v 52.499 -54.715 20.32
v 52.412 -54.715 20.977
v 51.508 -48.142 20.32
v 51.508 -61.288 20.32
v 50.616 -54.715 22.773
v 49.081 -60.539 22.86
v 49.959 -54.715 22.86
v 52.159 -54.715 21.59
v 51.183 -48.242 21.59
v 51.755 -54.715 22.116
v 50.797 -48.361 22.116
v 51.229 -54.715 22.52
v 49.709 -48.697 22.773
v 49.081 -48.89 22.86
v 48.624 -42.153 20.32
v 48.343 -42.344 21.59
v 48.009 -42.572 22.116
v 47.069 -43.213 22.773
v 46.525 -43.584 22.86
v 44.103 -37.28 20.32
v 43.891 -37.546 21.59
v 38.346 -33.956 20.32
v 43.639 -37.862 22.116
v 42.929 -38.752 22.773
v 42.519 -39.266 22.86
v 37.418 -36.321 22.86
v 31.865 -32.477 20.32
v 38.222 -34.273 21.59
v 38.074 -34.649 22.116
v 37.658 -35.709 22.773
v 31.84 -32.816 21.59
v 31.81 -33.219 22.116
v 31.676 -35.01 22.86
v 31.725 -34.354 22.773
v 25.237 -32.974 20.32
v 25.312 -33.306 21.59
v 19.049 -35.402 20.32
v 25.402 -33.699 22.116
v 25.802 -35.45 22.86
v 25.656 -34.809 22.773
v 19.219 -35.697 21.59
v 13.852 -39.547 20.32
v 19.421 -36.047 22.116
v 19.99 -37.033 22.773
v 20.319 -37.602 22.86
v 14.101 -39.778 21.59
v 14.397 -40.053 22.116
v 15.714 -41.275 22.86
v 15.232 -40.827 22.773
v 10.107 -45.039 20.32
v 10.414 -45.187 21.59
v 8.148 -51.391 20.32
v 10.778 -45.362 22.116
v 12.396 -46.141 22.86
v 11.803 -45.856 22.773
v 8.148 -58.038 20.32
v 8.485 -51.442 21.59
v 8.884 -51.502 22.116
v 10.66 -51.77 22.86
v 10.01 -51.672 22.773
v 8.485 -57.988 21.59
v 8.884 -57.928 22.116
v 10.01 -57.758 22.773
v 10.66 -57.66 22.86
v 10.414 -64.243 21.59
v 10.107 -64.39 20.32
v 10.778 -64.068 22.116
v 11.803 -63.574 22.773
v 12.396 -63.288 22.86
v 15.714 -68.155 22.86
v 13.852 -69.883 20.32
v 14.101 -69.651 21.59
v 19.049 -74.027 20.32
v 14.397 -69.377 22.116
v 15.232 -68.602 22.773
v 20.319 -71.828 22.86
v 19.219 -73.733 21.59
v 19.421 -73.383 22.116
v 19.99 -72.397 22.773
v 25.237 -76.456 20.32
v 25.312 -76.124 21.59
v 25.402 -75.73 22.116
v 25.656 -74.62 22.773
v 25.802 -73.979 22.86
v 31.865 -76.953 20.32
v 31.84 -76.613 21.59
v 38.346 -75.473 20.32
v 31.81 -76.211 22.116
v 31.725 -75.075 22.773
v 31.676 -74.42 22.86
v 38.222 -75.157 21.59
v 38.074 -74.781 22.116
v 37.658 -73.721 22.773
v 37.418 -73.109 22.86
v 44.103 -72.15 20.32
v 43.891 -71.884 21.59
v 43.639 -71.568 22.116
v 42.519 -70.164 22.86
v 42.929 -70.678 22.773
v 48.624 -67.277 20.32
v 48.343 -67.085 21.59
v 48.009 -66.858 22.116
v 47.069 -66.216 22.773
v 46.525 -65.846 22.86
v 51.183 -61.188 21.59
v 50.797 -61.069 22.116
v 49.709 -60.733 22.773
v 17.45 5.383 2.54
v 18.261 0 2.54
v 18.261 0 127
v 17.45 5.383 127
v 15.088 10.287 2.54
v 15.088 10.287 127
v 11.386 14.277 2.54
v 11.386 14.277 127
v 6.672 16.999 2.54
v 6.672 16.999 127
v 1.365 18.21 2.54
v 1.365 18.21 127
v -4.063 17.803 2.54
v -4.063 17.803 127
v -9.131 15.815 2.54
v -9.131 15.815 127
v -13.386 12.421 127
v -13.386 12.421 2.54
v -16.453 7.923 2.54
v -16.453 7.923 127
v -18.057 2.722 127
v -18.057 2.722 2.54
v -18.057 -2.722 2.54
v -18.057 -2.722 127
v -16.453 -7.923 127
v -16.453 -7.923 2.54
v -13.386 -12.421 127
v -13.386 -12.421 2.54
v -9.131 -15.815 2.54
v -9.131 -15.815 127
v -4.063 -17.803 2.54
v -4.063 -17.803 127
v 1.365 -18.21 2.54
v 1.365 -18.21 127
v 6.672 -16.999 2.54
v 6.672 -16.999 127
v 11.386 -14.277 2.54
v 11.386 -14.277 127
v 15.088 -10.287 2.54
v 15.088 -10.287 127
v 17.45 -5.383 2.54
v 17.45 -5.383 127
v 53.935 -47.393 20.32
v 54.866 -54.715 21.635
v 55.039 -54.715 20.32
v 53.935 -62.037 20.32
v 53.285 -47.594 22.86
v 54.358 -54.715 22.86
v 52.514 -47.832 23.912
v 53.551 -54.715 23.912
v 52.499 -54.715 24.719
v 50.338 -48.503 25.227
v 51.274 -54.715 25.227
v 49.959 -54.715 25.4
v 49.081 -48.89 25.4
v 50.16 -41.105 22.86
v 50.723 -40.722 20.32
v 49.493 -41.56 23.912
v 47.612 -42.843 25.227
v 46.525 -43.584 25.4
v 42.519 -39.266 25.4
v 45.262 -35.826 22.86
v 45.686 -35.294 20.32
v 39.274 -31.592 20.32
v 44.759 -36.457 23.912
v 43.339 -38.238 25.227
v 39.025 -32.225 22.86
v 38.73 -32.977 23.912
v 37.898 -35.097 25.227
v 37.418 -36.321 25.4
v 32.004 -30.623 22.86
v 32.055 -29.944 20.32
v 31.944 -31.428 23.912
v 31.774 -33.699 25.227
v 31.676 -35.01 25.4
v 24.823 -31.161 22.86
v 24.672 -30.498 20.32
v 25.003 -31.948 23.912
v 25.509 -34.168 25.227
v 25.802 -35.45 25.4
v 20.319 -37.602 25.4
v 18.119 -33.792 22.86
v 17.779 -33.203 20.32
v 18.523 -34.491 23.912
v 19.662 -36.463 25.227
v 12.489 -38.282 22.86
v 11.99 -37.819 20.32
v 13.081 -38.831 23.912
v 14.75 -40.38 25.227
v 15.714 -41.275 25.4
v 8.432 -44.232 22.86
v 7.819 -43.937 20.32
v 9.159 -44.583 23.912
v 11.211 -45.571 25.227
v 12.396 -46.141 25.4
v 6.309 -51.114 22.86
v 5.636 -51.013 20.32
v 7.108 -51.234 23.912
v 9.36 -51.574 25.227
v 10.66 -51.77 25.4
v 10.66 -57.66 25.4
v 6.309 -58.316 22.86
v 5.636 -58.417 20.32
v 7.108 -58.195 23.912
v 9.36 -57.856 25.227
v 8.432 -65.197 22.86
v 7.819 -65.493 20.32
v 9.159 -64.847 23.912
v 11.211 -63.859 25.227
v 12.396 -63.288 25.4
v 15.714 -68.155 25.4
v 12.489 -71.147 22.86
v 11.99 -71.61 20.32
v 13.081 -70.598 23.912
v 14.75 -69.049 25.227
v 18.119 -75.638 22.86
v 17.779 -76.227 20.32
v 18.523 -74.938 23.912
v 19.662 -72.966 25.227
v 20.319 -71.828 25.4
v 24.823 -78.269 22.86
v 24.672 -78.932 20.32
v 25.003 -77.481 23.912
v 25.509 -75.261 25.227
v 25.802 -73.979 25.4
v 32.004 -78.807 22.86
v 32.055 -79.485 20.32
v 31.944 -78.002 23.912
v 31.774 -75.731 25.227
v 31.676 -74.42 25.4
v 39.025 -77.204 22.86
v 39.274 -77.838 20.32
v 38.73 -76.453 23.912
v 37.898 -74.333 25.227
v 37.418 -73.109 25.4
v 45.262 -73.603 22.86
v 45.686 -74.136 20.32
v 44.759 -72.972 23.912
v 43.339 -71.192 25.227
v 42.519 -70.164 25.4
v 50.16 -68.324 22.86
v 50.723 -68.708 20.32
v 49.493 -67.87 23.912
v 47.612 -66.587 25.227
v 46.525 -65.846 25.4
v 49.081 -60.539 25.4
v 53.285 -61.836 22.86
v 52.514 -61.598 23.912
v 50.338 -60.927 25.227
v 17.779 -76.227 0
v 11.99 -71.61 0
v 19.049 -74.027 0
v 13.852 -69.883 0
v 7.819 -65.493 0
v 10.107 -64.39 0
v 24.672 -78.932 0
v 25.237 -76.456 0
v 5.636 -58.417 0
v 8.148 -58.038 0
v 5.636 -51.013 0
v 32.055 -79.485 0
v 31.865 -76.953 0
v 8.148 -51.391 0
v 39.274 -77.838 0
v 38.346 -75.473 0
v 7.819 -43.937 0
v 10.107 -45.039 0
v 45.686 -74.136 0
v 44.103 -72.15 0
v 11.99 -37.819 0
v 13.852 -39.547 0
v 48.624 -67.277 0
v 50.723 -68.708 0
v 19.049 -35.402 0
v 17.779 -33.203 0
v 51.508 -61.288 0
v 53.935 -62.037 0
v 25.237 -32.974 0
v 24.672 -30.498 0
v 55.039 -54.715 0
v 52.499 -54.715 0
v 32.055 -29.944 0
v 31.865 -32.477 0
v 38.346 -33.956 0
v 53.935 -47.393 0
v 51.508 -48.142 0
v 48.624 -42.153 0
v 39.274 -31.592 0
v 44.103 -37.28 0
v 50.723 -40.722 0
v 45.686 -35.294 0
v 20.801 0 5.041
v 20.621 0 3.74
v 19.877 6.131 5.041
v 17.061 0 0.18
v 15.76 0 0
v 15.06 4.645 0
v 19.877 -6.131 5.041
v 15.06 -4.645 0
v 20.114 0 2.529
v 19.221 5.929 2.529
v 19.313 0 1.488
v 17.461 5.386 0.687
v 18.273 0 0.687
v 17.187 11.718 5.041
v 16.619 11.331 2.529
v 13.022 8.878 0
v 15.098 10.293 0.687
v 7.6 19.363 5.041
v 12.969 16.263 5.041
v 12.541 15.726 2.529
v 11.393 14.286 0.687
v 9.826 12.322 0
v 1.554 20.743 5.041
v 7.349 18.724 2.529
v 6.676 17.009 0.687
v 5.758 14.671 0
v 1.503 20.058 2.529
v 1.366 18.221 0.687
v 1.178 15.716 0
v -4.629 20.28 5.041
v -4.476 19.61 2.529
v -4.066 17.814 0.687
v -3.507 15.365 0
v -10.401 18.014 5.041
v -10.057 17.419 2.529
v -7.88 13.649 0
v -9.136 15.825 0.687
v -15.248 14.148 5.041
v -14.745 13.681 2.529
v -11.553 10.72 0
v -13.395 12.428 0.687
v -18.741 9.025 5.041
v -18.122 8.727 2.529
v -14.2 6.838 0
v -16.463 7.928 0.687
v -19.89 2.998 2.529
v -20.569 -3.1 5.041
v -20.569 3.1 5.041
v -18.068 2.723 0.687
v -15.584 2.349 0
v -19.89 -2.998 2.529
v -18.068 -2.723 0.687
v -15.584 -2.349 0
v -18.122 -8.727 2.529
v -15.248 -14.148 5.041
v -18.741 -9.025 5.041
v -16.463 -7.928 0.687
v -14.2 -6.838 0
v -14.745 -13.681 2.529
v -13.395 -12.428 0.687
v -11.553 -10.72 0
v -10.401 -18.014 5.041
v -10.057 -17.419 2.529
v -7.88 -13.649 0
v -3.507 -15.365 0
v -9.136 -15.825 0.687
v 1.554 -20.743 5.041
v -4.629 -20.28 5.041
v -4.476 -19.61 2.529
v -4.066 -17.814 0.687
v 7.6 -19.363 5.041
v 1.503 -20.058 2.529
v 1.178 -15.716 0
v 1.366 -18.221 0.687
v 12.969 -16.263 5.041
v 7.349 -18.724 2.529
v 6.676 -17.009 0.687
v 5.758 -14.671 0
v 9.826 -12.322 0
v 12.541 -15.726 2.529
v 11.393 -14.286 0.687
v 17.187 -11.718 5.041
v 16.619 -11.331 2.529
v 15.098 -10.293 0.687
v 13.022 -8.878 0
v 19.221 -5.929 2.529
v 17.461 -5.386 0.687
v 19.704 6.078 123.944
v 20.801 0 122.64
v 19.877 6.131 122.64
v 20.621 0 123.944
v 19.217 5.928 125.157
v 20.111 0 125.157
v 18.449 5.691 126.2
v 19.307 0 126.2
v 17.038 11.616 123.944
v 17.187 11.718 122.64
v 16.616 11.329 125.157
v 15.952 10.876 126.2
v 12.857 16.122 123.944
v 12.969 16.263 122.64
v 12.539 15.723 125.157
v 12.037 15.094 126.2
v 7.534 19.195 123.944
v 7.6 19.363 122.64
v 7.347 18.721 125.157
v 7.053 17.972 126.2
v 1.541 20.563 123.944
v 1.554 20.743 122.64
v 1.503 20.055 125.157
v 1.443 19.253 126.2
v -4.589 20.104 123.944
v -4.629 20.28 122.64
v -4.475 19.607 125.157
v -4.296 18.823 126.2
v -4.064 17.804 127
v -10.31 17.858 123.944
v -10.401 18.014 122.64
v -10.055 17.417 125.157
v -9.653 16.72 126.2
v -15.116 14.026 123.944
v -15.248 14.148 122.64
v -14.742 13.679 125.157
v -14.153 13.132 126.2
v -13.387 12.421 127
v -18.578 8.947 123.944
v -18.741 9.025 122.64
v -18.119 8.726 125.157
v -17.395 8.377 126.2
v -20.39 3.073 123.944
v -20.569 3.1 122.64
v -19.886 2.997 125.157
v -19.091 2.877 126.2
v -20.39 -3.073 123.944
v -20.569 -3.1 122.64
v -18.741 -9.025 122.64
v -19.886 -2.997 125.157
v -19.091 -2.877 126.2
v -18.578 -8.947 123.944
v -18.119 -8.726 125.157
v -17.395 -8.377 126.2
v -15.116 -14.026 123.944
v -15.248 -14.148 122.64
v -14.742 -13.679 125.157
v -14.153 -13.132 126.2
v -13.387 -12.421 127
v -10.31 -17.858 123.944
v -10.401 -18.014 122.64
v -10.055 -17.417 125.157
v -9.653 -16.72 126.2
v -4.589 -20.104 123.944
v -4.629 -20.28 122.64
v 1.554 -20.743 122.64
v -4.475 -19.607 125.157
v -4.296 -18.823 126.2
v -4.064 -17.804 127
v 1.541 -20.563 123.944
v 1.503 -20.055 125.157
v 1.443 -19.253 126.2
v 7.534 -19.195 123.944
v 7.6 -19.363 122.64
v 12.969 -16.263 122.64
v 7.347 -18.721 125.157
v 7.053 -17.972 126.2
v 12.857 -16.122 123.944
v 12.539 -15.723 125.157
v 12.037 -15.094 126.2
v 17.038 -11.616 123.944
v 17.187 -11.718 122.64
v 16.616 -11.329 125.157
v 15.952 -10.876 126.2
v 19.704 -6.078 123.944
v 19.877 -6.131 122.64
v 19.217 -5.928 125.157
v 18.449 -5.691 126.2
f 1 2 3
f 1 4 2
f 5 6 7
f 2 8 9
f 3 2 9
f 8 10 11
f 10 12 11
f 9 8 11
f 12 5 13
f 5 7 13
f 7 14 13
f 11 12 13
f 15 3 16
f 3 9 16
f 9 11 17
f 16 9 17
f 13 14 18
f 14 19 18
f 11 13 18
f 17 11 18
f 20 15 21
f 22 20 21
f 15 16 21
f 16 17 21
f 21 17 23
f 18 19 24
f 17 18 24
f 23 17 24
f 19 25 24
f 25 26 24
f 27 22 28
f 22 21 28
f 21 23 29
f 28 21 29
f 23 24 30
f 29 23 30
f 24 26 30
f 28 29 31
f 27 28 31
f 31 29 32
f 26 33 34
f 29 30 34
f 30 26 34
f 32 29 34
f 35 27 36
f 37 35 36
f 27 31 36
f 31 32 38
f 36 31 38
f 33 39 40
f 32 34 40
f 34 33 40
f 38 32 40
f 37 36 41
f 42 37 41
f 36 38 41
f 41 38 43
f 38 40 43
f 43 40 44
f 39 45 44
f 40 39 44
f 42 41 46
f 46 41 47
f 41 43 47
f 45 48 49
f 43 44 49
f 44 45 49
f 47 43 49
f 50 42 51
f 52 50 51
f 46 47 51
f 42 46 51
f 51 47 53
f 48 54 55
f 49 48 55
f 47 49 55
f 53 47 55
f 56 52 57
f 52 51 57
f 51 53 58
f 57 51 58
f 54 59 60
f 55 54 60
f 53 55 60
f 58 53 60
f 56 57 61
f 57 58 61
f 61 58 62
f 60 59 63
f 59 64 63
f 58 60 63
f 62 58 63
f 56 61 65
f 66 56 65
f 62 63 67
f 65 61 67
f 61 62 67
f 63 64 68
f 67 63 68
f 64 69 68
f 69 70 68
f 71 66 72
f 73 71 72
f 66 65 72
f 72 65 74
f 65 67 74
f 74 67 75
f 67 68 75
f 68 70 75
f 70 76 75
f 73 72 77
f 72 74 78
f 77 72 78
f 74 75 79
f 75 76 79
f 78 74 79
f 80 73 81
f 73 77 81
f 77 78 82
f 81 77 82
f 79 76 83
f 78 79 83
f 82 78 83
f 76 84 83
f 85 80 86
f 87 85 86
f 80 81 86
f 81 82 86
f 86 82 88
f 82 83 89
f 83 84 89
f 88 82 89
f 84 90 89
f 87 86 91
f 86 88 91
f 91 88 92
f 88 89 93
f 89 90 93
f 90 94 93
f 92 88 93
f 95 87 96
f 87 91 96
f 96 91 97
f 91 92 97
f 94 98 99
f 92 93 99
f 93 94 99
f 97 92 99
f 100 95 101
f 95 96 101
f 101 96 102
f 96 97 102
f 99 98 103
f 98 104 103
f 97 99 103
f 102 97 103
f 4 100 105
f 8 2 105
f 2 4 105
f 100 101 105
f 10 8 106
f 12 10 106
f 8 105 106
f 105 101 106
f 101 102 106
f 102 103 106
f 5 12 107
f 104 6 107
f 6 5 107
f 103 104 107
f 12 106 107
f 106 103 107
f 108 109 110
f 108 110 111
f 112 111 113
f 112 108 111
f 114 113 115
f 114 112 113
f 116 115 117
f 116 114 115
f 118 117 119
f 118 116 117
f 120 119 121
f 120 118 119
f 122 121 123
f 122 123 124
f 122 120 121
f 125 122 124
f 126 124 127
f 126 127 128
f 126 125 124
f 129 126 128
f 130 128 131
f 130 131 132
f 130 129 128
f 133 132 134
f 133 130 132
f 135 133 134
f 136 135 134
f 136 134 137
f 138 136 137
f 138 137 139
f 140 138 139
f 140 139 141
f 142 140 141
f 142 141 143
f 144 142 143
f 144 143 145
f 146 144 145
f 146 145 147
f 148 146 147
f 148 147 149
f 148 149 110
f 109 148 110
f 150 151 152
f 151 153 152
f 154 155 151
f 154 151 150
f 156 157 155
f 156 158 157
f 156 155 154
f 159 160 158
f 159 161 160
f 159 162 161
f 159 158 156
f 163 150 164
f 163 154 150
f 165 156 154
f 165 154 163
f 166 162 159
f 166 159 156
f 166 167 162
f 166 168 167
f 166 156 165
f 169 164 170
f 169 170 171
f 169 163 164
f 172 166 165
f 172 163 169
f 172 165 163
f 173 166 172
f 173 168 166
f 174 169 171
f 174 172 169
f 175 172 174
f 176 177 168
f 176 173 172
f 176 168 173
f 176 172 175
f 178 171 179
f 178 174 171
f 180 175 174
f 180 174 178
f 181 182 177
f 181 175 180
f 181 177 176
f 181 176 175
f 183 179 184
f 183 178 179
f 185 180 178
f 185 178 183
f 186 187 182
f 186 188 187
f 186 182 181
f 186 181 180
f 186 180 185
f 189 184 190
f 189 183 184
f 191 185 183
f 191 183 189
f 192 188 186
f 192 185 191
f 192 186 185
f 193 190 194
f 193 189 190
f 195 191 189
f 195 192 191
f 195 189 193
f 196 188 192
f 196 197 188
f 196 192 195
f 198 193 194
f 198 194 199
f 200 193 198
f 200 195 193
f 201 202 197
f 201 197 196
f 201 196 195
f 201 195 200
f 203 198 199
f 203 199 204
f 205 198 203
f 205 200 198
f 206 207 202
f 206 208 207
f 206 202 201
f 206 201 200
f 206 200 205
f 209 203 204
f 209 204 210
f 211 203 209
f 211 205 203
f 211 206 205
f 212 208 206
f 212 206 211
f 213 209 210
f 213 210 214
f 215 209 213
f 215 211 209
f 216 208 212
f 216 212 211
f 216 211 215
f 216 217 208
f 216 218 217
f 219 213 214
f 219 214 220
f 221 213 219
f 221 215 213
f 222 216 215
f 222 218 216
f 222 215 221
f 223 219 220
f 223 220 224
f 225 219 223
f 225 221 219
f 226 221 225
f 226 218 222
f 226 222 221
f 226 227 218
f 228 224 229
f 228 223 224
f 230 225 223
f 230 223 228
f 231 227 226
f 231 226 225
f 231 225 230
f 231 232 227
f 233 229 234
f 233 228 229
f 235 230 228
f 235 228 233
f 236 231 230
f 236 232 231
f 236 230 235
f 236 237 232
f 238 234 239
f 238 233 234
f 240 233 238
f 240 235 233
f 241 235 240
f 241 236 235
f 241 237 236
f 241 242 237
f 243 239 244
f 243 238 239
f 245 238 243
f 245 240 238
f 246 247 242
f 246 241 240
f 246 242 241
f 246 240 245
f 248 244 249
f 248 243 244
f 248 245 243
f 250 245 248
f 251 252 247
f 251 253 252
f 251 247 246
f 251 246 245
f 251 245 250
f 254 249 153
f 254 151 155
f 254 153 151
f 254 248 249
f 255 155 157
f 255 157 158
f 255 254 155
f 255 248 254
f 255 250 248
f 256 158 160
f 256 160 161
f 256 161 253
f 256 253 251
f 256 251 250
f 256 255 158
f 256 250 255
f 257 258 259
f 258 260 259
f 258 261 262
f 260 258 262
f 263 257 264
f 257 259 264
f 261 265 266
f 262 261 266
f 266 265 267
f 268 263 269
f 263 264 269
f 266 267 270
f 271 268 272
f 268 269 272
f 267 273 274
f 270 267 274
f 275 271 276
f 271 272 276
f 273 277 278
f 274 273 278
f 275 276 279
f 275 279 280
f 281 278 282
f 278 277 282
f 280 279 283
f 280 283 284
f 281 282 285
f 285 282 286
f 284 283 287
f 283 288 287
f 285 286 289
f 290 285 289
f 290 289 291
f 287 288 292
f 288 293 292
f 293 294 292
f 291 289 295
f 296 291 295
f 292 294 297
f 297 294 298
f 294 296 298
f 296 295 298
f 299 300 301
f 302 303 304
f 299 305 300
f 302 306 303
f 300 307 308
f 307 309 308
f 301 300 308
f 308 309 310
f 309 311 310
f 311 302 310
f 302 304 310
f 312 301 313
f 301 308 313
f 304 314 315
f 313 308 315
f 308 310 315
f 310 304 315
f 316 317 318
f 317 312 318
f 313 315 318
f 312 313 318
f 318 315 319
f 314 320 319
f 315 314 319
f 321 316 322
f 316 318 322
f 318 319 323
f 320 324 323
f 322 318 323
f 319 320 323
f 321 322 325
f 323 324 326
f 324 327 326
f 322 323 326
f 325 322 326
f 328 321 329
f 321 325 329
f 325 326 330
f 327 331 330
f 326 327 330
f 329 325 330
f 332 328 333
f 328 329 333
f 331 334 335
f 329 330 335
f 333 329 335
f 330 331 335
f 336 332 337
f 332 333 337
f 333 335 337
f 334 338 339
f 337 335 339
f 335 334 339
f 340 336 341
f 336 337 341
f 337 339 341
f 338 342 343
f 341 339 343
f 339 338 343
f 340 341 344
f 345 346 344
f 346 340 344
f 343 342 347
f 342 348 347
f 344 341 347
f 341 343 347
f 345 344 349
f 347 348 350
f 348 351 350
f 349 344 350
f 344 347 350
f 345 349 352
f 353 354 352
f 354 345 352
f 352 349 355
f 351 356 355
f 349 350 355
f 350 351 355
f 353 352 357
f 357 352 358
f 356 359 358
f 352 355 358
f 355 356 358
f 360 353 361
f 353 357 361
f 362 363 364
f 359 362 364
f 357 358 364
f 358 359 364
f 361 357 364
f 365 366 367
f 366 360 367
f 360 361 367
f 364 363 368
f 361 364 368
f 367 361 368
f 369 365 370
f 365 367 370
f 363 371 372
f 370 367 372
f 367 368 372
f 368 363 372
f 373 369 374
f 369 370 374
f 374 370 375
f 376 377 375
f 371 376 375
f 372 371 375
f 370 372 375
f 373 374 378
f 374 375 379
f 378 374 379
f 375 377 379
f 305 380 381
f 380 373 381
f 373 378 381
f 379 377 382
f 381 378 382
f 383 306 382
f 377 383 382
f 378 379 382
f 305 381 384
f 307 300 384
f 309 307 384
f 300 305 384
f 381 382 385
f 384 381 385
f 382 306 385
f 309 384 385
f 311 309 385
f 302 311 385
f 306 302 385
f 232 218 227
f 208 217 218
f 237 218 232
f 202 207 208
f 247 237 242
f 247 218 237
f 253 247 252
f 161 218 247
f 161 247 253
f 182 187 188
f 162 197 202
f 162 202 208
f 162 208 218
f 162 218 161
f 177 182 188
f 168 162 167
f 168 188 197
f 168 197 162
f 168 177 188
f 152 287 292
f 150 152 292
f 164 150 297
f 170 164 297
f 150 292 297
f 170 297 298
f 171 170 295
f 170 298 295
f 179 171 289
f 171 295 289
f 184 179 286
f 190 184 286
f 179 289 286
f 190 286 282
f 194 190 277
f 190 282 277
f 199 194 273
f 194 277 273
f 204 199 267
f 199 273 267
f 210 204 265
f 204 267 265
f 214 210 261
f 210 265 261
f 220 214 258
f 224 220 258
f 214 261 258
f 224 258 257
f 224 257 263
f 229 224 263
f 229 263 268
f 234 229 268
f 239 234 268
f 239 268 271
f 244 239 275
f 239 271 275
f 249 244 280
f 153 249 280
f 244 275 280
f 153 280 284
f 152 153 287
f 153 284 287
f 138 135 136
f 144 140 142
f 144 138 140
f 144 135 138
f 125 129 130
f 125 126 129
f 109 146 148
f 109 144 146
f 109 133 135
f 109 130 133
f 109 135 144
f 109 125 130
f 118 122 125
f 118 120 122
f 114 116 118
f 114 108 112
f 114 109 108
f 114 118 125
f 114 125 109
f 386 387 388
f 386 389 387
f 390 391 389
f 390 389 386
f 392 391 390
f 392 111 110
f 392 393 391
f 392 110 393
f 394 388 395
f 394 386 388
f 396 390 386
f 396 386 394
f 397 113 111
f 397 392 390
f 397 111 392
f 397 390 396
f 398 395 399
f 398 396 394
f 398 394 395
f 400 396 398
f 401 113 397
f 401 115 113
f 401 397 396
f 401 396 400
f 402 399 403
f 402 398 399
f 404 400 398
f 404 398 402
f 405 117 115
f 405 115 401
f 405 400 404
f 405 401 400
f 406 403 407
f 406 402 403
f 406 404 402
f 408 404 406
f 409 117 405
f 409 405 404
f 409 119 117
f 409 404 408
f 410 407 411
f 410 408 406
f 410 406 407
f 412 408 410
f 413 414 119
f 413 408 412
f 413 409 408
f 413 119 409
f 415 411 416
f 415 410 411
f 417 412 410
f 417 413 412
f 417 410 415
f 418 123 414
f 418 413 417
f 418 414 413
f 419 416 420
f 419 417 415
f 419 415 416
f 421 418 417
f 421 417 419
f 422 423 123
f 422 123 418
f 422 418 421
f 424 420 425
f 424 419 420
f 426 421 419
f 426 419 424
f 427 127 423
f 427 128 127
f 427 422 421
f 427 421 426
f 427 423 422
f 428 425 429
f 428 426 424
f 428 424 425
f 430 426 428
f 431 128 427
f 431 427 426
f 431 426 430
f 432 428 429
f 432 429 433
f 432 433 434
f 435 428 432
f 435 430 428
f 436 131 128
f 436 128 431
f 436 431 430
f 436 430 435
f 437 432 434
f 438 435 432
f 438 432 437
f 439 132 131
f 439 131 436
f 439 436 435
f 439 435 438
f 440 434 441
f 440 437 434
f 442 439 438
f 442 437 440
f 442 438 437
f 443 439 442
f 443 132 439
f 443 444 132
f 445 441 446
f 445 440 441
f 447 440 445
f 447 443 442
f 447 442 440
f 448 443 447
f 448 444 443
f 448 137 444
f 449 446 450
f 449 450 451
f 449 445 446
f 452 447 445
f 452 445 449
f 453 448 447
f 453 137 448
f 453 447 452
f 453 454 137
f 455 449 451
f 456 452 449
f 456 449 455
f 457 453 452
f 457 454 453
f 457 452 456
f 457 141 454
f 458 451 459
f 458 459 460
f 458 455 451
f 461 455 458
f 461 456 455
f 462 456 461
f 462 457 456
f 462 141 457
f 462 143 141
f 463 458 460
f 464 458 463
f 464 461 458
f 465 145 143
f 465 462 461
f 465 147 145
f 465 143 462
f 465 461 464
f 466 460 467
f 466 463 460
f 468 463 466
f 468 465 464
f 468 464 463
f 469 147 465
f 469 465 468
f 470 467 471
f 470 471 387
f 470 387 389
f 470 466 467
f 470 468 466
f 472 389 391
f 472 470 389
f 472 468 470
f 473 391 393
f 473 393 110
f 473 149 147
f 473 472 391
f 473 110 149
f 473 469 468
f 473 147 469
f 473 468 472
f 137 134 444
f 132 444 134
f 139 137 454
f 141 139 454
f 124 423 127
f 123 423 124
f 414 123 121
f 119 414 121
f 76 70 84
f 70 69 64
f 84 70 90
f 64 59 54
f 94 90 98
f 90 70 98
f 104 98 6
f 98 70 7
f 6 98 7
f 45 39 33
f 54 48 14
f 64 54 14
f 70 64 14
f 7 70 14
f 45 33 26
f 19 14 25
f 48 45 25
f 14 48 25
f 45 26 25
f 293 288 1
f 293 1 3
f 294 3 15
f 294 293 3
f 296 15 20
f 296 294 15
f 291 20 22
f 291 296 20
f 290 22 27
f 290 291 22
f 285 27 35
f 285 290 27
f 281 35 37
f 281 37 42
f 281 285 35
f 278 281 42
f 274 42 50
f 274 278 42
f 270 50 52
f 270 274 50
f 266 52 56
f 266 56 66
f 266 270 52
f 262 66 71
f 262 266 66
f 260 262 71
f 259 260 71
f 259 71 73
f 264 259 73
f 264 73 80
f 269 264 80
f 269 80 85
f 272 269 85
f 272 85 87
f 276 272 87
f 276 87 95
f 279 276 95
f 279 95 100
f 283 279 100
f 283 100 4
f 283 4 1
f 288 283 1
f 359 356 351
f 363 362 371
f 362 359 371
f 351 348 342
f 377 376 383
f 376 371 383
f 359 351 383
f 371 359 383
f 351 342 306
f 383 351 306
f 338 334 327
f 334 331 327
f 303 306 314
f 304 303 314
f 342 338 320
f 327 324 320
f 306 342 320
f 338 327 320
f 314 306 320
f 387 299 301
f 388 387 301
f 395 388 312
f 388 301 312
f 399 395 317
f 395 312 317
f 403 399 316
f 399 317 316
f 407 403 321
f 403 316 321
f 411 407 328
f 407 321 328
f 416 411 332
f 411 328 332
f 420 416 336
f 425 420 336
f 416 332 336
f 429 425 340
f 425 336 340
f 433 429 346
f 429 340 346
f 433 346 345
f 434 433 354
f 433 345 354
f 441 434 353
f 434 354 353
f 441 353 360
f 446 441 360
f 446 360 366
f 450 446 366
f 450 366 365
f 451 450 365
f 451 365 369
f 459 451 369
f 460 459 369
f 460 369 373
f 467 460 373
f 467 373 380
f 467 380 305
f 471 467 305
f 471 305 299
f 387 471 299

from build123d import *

# Parameters (mm, degrees)
F0_R     = 20.8011529173
F1_DEPTH = 127
F2_T     = -2.54
F4_R     = 24.8400420573
F5_DEPTH = 25.4
F6_R     = 5.08
F7_T     = -2.54


# Not quite as in the source:
# - a fillet or chamfer that OpenCascade refuses, or shapes differently, is made with other operations: its cross-section is extruded or revolved along the edge and cut away or added


with BuildPart() as f1:
    # F0 (on Top) → F1 (new body)
    with BuildSketch(Plane.XY):
        Circle(F0_R)
    extrude(amount=F1_DEPTH)

    # F2
    f2_openings = [f1.faces().sort_by_distance(p)[0] for p in [
        (0, 0, 127),
    ]]
    offset(amount=F2_T, openings=f2_openings)

    # F3: fillet of radius 5.08 on 3 edges, made by hand

    # F3_s1 → F3_t2 (revolve, cut)
    with BuildSketch(Plane.XZ):
        with BuildLine():
            ThreePointArc((20.8013029173, 5.07985), (19.3134053657, 1.4877475516), (15.7213029173, -0.00015))
            Line((15.7213029173, -0.00015), (15.7213029173, -0.10175))
            ThreePointArc((15.7213029173, -0.10175), (18.2612279173, -0.1016), (20.8011529173, -0.1016))
            Line((20.8011529173, -0.1016), (20.9027529173, 0))
            ThreePointArc((20.9027529173, 0), (20.9027529173, 2.539925), (20.9029029173, 5.07985))
            Line((20.9029029173, 5.07985), (20.8013029173, 5.07985))
        make_face()
    revolve(axis=Axis((0, 0, 0), (0, 0, 1)), mode=Mode.SUBTRACT)

    # F3_s3 → F3_t4 (revolve, cut)
    with BuildSketch(Plane.XZ):
        with BuildLine():
            ThreePointArc((20.8013029173, 122.6006775522), (20.1206903172, 125.140715053), (18.2612279151, 127.0001299051))
            Line((18.2612279151, 127.0001299051), (18.312026415, 127.0881189521))
            ThreePointArc((18.312026415, 127.0881189521), (19.5311904162, 127.1016), (20.8011529173, 127.1016))
            Line((20.8011529173, 127.1016), (20.9027529173, 127))
            ThreePointArc((20.9027529173, 127), (20.9027529173, 124.8003387761), (20.9029029173, 122.6006775522))
            Line((20.9029029173, 122.6006775522), (20.8013029173, 122.6006775522))
        make_face()
    revolve(axis=Axis((0, 0, 127), (0, 0, 1)), mode=Mode.SUBTRACT)


with BuildPart() as f5:
    # F4 (on Top) → F5 (new body)
    with BuildSketch(Plane.XY):
        with Locations((30.1989763975, -54.7148250043)):
            Circle(F4_R)
    extrude(amount=F5_DEPTH)

    # F6
    f6_edges = [f5.edges().sort_by_distance(p)[0] for p in [
        (5.358934, -54.714825, 25.4),
    ]]
    fillet(f6_edges, radius=F6_R)

    # F7
    f7_openings = [f5.faces().sort_by_distance(p)[0] for p in [
        (30.198976, -54.714825, 0),
    ]]
    offset(amount=F7_T, openings=f7_openings)


solid = Compound([f1.part, f5.part])
